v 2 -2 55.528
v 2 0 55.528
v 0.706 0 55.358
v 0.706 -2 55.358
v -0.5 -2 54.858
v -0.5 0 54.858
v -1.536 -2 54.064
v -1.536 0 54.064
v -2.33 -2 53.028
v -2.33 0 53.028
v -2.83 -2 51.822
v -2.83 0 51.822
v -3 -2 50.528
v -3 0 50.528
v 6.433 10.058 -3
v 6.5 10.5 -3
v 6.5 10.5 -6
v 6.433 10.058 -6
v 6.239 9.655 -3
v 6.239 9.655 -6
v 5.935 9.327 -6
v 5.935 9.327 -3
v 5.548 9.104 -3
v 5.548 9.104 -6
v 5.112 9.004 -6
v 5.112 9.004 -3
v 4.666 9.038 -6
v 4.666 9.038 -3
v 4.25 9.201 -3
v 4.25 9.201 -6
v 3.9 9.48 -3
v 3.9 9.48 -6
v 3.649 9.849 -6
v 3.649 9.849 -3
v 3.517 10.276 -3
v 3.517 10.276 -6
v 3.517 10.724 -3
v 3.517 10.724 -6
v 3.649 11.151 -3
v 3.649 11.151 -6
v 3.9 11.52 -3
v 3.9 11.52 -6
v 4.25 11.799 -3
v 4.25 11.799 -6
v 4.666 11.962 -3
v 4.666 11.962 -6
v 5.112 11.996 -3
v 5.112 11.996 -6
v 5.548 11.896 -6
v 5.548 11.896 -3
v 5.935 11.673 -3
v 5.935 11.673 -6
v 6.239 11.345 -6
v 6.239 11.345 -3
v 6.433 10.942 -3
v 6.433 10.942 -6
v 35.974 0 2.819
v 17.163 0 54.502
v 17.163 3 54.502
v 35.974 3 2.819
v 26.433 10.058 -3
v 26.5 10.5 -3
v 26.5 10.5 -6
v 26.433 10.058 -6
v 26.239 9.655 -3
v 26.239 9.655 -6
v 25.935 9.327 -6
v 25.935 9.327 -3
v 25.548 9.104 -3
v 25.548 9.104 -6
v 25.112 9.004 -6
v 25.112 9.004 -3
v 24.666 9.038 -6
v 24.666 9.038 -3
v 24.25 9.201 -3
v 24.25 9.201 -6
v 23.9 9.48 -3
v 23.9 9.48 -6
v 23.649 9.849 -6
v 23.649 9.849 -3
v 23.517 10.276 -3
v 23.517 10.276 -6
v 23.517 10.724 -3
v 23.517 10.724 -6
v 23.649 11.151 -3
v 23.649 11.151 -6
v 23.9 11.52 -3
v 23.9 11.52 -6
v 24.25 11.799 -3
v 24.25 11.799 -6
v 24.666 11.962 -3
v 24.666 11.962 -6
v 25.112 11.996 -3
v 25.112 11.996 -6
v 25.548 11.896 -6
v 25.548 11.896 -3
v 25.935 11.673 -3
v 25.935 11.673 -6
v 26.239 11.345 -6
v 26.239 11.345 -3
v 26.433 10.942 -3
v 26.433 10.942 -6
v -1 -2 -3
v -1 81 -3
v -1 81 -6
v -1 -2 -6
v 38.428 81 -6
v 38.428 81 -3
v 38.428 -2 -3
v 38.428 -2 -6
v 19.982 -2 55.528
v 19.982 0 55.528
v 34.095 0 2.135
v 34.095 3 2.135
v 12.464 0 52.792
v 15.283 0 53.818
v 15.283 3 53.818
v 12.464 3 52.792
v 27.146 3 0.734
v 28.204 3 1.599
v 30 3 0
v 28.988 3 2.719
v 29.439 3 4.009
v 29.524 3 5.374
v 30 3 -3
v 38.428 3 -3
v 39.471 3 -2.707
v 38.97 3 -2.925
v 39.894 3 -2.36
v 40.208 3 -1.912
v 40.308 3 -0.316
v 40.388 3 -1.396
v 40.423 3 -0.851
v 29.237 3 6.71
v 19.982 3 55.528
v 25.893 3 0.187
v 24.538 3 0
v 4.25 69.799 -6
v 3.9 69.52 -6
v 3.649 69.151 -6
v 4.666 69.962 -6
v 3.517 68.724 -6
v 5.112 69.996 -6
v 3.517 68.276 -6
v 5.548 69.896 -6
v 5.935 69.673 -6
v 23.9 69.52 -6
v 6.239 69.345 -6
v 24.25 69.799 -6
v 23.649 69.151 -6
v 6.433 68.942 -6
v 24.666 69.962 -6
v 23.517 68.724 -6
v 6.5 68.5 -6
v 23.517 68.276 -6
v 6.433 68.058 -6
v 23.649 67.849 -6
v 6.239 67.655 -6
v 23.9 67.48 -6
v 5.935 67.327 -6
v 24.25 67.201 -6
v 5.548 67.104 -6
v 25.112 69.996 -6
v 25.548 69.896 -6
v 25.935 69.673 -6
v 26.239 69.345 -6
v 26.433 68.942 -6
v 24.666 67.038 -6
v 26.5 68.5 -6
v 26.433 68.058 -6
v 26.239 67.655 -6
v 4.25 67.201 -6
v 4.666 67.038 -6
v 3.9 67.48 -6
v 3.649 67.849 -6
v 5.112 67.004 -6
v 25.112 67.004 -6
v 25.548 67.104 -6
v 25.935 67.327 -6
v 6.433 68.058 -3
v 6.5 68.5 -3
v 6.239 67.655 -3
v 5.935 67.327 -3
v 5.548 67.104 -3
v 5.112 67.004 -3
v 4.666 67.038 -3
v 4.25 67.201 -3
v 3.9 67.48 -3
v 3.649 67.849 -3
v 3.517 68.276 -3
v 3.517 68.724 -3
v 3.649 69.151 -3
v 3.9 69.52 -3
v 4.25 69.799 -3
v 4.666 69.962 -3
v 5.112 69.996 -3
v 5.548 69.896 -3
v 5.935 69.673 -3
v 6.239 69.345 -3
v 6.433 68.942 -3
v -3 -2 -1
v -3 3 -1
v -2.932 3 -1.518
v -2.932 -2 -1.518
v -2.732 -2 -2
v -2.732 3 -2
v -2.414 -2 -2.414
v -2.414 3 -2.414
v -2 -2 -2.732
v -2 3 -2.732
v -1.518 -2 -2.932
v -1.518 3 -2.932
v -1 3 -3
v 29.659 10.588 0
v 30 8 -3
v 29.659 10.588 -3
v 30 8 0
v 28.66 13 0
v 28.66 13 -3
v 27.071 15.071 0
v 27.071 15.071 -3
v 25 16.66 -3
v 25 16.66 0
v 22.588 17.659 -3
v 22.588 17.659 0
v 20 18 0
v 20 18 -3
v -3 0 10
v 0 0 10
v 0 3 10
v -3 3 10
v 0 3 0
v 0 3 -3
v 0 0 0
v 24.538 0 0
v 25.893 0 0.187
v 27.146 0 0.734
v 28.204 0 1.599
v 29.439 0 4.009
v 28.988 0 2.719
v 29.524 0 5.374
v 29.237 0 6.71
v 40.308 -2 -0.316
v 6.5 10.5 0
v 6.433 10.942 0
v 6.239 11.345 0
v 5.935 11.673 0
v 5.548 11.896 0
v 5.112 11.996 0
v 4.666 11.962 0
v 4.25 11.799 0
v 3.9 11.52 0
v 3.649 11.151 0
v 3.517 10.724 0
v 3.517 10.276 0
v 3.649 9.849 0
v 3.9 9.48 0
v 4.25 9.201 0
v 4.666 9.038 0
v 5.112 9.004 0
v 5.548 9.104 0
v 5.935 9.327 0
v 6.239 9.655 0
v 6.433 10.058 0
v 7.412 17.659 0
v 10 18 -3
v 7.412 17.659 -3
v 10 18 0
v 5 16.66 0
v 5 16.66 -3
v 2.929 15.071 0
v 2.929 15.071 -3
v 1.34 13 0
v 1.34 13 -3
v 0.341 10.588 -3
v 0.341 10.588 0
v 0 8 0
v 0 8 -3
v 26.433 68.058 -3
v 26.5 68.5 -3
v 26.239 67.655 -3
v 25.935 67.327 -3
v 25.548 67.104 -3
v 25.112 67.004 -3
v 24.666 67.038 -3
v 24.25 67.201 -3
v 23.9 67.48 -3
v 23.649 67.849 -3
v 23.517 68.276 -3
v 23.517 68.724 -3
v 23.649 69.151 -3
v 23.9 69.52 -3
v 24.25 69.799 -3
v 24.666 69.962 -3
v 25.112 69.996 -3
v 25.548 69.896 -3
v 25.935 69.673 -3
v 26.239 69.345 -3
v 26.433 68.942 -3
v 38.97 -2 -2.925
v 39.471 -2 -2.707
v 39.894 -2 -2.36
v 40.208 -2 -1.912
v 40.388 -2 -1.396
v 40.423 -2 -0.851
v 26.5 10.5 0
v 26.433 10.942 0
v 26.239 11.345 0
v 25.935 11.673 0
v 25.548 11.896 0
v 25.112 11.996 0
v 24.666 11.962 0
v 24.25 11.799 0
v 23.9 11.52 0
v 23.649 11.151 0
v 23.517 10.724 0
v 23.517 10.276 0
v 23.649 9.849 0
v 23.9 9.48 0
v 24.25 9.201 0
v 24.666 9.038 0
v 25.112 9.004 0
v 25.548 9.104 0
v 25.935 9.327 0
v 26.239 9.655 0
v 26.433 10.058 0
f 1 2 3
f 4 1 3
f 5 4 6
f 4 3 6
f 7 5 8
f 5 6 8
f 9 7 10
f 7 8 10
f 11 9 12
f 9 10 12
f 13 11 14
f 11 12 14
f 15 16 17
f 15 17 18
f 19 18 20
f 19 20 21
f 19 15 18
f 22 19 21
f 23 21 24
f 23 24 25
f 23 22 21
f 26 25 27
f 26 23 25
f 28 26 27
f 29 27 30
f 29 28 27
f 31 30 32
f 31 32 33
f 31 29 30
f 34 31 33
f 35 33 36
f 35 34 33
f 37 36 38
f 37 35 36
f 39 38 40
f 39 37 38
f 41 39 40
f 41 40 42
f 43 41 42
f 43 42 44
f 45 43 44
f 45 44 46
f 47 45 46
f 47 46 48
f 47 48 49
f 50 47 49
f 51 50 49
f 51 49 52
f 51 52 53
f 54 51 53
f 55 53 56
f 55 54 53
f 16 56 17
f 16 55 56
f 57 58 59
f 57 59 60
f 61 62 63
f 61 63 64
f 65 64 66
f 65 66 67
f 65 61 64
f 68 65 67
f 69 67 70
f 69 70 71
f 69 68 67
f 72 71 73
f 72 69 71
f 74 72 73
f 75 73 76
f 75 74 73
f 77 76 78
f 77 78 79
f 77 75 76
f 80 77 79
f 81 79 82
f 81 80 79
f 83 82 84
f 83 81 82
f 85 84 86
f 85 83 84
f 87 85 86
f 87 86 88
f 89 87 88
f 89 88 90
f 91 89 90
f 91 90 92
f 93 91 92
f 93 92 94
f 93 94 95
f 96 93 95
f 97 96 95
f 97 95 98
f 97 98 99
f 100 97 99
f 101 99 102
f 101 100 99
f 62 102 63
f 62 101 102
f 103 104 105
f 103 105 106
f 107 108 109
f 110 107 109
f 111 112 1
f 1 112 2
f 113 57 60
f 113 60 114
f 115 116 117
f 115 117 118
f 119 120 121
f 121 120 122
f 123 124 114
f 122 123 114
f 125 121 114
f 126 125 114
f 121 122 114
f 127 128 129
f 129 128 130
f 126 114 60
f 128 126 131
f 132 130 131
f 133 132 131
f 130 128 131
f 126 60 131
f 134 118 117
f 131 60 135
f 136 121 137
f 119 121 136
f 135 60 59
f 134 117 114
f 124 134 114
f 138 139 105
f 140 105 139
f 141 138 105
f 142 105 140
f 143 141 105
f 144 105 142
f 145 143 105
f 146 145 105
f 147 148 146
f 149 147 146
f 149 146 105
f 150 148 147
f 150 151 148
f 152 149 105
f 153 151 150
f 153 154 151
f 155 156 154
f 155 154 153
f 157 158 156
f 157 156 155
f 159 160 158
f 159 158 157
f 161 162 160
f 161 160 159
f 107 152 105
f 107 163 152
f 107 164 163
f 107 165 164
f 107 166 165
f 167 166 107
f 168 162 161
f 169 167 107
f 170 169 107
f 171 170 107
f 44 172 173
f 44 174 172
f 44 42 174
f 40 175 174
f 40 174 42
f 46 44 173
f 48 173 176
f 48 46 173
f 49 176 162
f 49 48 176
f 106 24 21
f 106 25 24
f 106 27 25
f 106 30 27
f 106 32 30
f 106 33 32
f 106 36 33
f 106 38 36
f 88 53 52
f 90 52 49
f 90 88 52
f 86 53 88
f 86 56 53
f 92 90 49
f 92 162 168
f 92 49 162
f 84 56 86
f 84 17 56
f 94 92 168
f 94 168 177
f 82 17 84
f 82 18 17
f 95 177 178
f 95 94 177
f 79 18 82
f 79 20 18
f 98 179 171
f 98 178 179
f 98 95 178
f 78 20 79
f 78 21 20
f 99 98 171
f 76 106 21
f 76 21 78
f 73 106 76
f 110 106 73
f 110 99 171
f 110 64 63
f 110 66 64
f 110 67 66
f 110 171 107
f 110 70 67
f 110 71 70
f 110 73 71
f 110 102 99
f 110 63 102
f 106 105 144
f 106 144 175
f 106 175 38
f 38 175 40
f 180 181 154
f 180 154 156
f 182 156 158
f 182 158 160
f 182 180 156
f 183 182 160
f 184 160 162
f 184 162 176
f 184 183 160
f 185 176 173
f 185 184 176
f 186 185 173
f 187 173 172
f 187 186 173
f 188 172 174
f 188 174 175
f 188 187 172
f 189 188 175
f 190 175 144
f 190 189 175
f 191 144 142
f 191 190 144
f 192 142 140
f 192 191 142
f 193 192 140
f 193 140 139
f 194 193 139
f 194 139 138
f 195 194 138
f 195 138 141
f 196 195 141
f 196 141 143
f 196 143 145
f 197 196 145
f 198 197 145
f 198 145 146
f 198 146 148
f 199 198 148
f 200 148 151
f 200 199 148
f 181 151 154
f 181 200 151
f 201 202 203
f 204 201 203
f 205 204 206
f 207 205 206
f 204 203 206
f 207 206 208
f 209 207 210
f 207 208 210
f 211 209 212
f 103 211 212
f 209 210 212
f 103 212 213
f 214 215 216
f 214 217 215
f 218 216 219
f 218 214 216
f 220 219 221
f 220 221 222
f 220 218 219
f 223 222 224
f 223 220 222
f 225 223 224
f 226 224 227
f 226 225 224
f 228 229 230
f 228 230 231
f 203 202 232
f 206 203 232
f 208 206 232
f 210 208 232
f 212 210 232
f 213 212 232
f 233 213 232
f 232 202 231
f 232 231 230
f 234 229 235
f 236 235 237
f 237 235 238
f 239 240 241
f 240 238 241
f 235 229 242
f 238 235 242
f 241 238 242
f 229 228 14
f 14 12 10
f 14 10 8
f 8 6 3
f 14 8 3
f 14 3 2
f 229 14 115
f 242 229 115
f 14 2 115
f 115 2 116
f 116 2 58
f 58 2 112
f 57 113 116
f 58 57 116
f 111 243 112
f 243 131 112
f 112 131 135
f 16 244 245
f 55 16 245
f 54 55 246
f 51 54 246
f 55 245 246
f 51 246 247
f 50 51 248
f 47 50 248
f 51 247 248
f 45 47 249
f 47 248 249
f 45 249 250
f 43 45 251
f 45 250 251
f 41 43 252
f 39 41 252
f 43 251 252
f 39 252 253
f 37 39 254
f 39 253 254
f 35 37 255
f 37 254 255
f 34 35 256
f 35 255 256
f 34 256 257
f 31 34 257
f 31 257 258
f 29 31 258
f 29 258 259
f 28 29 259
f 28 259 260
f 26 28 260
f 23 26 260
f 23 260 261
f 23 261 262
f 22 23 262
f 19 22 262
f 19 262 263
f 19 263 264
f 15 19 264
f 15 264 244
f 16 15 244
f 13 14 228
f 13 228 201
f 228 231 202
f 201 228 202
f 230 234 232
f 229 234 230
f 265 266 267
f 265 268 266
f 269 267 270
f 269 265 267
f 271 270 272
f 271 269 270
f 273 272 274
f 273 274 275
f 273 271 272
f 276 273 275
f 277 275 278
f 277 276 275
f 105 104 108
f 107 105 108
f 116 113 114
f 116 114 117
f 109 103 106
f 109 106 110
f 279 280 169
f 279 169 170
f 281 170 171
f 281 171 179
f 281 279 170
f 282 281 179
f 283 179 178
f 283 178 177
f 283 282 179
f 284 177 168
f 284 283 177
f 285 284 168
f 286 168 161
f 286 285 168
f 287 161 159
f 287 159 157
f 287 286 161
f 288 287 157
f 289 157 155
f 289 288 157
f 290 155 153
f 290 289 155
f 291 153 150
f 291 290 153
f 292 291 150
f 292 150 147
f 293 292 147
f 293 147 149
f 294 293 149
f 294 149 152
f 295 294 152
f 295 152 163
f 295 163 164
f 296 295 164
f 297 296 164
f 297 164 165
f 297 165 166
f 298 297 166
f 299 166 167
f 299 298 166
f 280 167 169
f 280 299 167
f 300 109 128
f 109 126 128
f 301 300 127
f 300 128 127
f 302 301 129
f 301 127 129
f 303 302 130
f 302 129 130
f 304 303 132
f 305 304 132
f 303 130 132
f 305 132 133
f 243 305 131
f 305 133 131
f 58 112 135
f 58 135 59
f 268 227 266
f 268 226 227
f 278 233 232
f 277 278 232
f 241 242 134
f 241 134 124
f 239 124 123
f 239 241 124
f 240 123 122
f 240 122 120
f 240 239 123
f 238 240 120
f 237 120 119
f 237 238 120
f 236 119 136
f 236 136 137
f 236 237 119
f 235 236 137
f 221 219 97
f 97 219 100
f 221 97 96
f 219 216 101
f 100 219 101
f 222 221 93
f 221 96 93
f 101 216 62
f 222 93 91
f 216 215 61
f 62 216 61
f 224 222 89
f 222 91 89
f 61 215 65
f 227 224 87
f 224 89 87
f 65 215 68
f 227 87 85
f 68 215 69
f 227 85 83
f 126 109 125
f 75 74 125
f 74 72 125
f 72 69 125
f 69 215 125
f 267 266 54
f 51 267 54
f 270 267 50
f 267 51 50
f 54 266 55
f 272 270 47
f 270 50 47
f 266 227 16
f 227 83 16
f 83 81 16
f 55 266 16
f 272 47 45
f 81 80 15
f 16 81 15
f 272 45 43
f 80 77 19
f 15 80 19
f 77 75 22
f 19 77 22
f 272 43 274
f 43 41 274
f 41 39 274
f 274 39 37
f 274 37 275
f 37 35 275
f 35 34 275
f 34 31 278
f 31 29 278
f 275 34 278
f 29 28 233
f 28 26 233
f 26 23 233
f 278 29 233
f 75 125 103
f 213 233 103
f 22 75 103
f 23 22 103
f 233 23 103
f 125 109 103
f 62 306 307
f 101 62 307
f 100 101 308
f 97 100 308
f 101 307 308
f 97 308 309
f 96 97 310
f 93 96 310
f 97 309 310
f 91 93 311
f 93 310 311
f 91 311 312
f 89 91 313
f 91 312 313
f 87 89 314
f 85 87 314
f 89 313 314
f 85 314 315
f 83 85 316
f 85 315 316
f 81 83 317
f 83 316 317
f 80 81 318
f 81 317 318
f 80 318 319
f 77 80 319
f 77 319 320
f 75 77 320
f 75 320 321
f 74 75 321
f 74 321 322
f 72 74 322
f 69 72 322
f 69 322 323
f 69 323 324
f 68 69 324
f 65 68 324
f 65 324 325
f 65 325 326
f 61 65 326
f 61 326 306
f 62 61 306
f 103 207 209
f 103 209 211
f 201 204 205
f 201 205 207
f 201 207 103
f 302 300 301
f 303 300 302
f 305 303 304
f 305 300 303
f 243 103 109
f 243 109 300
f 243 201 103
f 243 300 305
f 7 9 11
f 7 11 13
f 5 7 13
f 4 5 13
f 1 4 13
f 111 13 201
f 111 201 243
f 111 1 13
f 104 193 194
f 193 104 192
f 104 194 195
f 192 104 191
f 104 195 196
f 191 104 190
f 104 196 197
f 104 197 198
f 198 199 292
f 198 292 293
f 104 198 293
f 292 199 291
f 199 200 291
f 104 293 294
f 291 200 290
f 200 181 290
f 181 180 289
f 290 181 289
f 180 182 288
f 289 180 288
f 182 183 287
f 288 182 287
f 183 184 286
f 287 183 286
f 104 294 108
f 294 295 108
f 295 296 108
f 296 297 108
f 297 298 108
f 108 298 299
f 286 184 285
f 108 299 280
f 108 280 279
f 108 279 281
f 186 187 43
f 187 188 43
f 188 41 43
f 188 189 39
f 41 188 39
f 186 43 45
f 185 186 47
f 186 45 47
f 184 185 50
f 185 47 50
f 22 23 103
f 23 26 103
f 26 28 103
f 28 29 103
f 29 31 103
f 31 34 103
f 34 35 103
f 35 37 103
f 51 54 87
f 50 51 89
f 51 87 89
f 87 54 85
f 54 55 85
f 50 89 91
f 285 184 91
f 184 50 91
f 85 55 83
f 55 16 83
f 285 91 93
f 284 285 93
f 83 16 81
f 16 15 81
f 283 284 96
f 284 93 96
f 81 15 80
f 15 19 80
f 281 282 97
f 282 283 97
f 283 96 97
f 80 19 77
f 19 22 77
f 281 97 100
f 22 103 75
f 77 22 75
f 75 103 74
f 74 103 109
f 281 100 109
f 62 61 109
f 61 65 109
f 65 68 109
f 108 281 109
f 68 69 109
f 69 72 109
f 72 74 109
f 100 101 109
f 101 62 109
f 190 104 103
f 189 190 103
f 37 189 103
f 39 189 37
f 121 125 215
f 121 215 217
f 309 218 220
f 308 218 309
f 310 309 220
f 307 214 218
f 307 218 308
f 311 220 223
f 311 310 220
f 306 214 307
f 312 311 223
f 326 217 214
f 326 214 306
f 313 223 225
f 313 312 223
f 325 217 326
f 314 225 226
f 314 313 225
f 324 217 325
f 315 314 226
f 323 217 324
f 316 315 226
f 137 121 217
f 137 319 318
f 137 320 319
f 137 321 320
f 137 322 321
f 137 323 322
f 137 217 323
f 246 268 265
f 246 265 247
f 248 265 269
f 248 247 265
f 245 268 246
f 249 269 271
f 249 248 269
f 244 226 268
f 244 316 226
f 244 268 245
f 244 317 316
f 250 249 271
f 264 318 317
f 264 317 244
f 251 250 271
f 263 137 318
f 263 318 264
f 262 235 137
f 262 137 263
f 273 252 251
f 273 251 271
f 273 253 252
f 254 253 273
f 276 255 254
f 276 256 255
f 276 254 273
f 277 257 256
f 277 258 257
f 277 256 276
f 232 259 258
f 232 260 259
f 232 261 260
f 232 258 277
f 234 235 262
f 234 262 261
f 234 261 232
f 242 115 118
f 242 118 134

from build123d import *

# Parameters (mm, degrees)
F1_DEPTH  = 3
F3_DEPTH  = 2
F4_W      = 30
F4_H      = 3
F5_DEPTH  = 15
F6_R      = 1.5
F7_DEPTH  = 3.001
F8_R      = 10
F9_W      = 39.428148
F9_H      = 83
F9_R      = 1.5
F10_DEPTH = 3


with BuildPart() as f1:
    # F0 (on Front) → F1 (new body)
    with BuildSketch(Plane.XZ):
        with BuildLine():
            Line((24.538371, 0), (0, 0))
            Line((0, 0), (0, 10))
            Line((0, 10), (-3, 10))
            Line((-3, 10), (-3, -1))
            ThreePointArc((-3, -1), (-2.414214, -2.414214), (-1, -3))
            Line((-1, -3), (38.428148, -3))
            ThreePointArc((38.428148, -3), (40.066452, -2.147153), (40.307533, -0.31596))
            Line((40.307533, -0.31596), (19.98191, 55.528232))
            Line((19.98191, 55.528232), (17.162832, 54.502172))
            Line((17.162832, 54.502172), (35.97394, 2.819078))
            Line((35.97394, 2.819078), (34.094554, 2.135038))
            Line((34.094554, 2.135038), (15.283446, 53.818132))
            Line((15.283446, 53.818132), (12.464369, 52.792071))
            Line((12.464369, 52.792071), (29.236834, 6.710101))
            ThreePointArc((29.236834, 6.710101), (28.634131, 2.132118), (24.538371, 0))
        make_face()
    extrude(amount=-F1_DEPTH)

    # F2 (on Front) → F3 (join)
    with BuildSketch(Plane.XZ):
        with BuildLine():
            Line((-1, -3), (38.428148, -3))
            ThreePointArc((38.428148, -3), (40.066452, -2.147153), (40.307533, -0.31596))
            Line((40.307533, -0.31596), (19.98191, 55.528232))
            Line((19.98191, 55.528232), (2, 55.528232))
            ThreePointArc((2, 55.528232), (-1.535534, 54.063766), (-3, 50.528232))
            Line((-3, 50.528232), (-3, 10))
            Line((-3, 10), (-3, -1))
            ThreePointArc((-3, -1), (-2.414214, -2.414214), (-1, -3))
        make_face()
    extrude(amount=F3_DEPTH)

    # F4 (on face) → F5 (join)
    with BuildSketch(Plane(origin=(0, 3, 0), x_dir=(-1, 0, 0), z_dir=(0, 1, 0))):
        with Locations((-15, -1.5)):
            Rectangle(F4_W, F4_H)
    extrude(amount=F5_DEPTH)

    # F6 (on face) → F7 (cut, through all)
    with BuildSketch(Plane.XY):
        with Locations((25, 10.5)):
            Circle(F6_R)
        with Locations((5, 10.5)):
            Circle(F6_R)
    extrude(amount=-F7_DEPTH, mode=Mode.SUBTRACT)

    # F8
    f8_edges = [f1.edges().sort_by_distance(p)[0] for p in [
        (30, 18, -1.5),
        (0, 18, -1.5),
    ]]
    fillet(f8_edges, radius=F8_R)


with BuildPart() as f10:
    # F9 (on face) → F10 (new body)
    with BuildSketch(Plane(origin=(0, 0, -3), x_dir=(1, 0, 0), z_dir=(0, 0, -1))):
        with Locations((18.714074, -39.5)):
            Rectangle(F9_W, F9_H)
        with Locations((5, -68.5)):
            Circle(F9_R, mode=Mode.SUBTRACT)
        with Locations((25, -68.5)):
            Circle(F9_R, mode=Mode.SUBTRACT)
        with Locations((5, -10.5)):
            Circle(F9_R, mode=Mode.SUBTRACT)
        with Locations((25, -10.5)):
            Circle(F9_R, mode=Mode.SUBTRACT)
    extrude(amount=F10_DEPTH)


solid = Compound([f1.part, f10.part])
